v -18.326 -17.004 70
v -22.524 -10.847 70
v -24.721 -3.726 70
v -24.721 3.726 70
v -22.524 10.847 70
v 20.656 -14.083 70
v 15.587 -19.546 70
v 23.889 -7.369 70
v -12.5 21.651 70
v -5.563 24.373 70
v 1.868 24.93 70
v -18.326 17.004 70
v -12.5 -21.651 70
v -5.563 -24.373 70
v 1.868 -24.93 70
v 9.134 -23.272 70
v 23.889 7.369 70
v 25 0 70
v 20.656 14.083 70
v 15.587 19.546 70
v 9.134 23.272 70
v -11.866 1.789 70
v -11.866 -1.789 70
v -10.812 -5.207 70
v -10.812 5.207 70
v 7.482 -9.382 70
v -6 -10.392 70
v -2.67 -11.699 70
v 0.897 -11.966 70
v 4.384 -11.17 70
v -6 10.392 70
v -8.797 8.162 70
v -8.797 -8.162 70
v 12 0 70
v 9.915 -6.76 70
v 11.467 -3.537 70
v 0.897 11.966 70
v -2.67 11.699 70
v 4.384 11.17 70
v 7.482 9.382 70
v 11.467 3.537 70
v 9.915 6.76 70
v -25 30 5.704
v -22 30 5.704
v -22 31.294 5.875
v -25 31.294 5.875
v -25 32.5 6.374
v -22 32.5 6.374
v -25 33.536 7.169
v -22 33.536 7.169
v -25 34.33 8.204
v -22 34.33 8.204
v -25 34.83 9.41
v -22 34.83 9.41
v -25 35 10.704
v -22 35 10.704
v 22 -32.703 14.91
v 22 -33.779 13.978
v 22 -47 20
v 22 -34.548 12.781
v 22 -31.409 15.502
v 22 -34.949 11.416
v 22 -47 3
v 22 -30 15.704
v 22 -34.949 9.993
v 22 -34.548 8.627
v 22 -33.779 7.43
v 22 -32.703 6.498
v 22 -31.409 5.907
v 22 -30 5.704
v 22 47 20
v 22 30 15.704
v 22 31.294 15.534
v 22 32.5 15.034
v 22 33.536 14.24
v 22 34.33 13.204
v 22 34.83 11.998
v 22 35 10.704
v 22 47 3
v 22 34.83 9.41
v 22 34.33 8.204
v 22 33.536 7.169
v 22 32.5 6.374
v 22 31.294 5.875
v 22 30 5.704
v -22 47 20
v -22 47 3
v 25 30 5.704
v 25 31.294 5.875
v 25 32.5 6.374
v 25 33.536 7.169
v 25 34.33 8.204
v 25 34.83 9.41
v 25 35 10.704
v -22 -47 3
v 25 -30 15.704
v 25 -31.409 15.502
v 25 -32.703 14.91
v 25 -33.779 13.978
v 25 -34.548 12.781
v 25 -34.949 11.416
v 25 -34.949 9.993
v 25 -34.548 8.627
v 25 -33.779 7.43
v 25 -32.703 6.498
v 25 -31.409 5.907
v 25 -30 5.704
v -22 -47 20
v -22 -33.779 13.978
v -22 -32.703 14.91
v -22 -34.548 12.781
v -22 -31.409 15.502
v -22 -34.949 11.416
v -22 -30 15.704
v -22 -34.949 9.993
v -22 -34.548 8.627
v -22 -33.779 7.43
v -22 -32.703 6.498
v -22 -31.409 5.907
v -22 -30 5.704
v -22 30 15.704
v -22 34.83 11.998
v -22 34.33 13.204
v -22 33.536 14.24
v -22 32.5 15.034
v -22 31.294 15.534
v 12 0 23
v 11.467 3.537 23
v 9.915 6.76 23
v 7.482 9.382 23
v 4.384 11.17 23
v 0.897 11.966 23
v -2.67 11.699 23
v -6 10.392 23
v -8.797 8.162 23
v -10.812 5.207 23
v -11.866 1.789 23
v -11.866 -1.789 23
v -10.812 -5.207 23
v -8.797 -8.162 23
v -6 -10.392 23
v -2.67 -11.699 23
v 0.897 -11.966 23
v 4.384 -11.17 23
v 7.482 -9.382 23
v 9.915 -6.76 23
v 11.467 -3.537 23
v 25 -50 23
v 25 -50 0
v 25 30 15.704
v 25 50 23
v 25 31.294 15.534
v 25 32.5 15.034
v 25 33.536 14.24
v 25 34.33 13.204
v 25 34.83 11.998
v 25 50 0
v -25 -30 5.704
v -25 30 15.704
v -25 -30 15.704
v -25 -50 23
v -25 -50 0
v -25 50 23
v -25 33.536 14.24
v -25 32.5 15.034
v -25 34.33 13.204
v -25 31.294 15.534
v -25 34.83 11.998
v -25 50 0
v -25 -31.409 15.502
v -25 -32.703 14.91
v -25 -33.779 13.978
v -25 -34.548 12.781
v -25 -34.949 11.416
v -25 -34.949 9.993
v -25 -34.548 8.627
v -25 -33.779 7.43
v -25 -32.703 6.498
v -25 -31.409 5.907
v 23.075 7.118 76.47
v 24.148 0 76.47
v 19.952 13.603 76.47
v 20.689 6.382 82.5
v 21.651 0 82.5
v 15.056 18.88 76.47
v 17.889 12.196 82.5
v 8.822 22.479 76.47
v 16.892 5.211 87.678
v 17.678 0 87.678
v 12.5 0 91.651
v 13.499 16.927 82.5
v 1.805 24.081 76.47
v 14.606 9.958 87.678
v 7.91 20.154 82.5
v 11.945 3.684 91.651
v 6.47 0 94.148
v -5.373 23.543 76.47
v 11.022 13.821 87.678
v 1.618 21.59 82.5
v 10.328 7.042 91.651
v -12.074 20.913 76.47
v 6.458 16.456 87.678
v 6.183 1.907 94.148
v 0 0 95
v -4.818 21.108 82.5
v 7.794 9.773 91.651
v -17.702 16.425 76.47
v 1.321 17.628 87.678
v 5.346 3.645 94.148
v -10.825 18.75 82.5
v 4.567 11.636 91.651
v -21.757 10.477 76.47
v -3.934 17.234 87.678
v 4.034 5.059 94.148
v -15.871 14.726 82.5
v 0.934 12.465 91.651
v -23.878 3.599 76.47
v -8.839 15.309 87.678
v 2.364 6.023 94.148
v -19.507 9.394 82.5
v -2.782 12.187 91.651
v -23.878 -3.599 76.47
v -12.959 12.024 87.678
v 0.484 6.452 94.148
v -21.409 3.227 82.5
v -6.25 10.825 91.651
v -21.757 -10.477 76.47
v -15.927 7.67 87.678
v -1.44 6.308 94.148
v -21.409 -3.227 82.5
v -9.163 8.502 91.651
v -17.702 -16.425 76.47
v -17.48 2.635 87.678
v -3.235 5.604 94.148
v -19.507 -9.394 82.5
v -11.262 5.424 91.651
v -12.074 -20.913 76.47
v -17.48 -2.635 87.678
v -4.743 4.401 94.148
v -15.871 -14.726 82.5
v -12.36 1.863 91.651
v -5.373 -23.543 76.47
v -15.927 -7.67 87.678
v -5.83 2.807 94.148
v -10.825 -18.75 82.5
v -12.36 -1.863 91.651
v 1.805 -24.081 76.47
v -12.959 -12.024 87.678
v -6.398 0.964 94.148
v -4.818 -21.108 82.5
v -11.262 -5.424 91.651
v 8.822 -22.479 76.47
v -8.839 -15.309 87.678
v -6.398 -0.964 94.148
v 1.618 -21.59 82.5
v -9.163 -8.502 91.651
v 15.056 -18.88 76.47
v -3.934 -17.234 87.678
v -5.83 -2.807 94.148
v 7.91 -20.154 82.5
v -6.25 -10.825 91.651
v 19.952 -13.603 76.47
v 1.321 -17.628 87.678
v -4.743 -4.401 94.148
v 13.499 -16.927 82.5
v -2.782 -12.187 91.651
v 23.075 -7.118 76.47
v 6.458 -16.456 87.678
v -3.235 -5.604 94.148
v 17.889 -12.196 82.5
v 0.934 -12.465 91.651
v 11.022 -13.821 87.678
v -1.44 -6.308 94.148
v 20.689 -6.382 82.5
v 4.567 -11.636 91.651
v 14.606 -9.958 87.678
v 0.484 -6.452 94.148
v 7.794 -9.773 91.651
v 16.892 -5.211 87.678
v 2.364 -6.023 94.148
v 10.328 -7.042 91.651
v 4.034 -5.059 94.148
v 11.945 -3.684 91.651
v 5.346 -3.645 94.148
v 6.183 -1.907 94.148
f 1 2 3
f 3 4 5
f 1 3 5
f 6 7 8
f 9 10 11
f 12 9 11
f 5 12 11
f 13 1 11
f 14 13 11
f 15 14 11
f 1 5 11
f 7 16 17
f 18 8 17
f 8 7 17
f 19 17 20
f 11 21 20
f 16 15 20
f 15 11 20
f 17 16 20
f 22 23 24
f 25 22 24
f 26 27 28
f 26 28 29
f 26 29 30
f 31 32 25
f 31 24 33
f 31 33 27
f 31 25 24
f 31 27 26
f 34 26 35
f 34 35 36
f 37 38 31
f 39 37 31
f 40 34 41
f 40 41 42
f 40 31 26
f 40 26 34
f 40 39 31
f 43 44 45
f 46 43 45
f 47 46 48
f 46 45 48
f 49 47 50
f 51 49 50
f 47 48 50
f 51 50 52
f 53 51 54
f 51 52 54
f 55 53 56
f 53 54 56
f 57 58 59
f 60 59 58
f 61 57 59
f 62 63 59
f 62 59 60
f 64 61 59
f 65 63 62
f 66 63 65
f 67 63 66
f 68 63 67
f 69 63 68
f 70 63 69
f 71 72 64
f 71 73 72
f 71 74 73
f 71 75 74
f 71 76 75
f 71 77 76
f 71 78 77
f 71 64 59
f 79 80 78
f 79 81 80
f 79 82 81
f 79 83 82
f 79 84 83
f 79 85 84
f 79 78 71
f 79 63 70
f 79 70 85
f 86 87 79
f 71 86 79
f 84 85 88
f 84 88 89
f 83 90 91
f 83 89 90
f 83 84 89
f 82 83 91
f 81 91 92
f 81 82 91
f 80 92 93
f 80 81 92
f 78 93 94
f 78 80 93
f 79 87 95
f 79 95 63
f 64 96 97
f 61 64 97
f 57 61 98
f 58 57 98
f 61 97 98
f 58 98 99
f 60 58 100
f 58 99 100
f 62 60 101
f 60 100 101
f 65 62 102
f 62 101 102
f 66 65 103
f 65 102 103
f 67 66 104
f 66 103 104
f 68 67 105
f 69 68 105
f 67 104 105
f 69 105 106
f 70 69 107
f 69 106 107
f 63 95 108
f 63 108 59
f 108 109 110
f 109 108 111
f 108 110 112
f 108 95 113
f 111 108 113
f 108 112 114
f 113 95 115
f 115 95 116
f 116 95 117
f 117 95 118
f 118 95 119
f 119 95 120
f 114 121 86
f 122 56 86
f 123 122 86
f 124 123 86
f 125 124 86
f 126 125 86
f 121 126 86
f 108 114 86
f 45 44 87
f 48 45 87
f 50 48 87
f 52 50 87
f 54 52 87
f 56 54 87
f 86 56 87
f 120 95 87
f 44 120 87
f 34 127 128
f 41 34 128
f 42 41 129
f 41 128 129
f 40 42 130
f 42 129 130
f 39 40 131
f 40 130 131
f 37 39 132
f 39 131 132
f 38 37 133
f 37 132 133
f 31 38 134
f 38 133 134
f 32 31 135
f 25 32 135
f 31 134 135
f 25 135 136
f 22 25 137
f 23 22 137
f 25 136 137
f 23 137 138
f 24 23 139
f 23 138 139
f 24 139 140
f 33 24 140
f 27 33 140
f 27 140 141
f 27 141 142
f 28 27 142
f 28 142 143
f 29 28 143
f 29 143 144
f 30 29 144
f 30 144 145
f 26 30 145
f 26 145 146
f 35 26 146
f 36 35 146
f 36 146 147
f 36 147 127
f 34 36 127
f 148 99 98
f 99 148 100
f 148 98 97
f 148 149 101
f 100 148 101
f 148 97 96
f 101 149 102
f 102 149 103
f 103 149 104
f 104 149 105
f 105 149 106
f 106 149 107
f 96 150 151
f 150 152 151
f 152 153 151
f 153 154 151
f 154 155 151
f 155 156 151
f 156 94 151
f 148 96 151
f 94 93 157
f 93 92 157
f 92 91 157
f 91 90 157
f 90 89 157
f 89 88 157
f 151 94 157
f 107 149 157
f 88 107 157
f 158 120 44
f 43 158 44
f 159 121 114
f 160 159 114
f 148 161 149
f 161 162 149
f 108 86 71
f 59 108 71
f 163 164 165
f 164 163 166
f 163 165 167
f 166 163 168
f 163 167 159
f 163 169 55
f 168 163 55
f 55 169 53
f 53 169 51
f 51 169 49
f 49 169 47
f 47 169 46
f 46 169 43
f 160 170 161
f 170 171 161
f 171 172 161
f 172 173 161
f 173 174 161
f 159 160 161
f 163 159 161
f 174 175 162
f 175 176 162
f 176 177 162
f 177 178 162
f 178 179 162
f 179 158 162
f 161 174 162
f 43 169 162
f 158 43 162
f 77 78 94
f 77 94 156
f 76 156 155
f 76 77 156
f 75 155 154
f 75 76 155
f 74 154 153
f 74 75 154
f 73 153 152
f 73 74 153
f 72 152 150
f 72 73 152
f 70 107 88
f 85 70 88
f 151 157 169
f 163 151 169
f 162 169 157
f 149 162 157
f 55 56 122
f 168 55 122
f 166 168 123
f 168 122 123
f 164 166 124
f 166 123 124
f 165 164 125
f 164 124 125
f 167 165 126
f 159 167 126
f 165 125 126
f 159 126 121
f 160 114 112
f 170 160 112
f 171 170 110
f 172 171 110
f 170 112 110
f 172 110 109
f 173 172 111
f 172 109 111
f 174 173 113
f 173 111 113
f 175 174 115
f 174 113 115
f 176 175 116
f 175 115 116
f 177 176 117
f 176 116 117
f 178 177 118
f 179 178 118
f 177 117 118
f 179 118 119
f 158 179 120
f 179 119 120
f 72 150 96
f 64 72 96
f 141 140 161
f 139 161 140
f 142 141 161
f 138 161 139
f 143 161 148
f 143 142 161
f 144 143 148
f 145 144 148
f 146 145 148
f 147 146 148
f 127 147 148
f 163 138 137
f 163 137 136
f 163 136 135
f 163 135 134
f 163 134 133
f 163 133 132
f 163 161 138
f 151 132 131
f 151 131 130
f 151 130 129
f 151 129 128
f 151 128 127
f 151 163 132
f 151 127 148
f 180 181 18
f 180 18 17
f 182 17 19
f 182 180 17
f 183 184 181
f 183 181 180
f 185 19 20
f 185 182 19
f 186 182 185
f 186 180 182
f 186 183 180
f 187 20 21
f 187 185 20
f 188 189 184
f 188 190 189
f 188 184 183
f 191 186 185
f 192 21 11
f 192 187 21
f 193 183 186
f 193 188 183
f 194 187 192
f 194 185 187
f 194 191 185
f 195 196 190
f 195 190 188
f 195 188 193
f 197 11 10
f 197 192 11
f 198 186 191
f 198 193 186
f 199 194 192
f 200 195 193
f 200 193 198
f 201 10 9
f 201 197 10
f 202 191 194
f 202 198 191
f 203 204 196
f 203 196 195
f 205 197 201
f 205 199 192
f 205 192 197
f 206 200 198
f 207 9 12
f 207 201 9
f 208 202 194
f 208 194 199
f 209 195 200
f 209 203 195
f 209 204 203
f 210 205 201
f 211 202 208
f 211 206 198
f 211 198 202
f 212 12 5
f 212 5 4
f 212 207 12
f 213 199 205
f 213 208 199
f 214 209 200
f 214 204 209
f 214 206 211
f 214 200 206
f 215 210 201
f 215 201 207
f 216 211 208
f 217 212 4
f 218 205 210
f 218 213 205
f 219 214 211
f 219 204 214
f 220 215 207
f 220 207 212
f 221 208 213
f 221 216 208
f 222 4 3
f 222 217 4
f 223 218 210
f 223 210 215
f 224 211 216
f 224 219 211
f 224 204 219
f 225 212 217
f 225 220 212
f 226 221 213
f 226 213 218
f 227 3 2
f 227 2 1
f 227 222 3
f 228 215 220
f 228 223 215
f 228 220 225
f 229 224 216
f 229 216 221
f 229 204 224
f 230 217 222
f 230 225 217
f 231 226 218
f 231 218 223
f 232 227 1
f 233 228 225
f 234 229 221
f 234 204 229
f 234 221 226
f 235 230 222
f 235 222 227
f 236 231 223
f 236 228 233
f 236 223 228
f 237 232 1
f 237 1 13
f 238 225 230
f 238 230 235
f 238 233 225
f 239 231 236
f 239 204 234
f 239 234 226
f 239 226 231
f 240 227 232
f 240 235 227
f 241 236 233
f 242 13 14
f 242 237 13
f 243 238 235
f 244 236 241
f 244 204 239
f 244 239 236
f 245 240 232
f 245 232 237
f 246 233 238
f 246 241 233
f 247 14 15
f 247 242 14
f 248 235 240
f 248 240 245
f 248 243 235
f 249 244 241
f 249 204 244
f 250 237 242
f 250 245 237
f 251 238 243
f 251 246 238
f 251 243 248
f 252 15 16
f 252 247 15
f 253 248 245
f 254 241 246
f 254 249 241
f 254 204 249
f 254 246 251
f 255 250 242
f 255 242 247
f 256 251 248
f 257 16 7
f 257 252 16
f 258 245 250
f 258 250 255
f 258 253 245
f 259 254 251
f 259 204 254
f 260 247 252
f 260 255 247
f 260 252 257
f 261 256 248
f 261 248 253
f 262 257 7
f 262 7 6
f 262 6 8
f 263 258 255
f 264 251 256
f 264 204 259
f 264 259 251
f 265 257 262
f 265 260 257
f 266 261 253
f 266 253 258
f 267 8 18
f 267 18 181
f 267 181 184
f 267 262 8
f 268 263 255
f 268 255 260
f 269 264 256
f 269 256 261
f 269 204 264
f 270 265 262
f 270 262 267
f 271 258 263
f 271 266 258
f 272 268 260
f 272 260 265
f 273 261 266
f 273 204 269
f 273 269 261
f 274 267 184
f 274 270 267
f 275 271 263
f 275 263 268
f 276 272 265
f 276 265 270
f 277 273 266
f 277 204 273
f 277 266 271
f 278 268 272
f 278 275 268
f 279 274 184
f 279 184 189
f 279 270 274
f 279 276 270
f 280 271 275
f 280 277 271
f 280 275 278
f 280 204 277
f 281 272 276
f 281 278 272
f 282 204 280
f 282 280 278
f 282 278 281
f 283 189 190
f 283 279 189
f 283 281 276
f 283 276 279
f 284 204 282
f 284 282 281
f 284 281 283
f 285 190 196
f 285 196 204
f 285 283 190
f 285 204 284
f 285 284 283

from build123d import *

# Parameters (mm, degrees)
F0_W      = 50
F0_H      = 100
F0_W_2    = 44
F0_H_2    = 94
F1_DEPTH  = 20
F2_DEPTH  = 3
F3_R      = 12
F4_DEPTH  = 3
F5_DEPTH  = 50
F6_R      = 25
F6_R_2    = 12
F7_DEPTH  = 25
F8_R      = 24.99999
F10_DEPTH = 30


# Not quite as in the source:
# - a fillet or chamfer is up to 0.001 mm smaller than in the source, because OpenCascade refuses the exact size
# - a feature names something its author has since deleted; it is built from what else it names


with BuildPart() as f1:
    # F0 (on Top) → F1 (new body)
    with BuildSketch(Plane.XY):
        Rectangle(F0_W, F0_H)
        Rectangle(F0_W_2, F0_H_2, mode=Mode.SUBTRACT)
    extrude(amount=F1_DEPTH)

    # F0 (on Top) → F2 (join)
    with BuildSketch(Plane.XY):
        Rectangle(F0_W, F0_H)
        Rectangle(F0_W_2, F0_H_2, mode=Mode.SUBTRACT)
        Rectangle(F0_W_2, F0_H_2)
    extrude(amount=F2_DEPTH)

    # F3 (on face) → F4 (join)
    with BuildSketch(Plane.XY.offset(20)):
        with BuildLine():
            ThreePointArc((22, 11.874342087), (0, 25), (-22, 11.874342087))
            Line((-22, 11.874342087), (-22, -11.874342087))
            ThreePointArc((-22, -11.874342087), (0, -25), (22, -11.874342087))
            Line((22, -11.874342087), (22, 11.874342087))
        make_face()
        Circle(F3_R, mode=Mode.SUBTRACT)
        with BuildLine():
            ThreePointArc((22, -11.874342087), (0, -25), (-22, -11.874342087))
            Line((-22, -11.874342087), (-22, -47))
            Line((-22, -47), (22, -47))
            Line((22, -47), (22, -11.874342087))
        make_face()
        with BuildLine():
            Line((-22, 47), (-22, 11.874342087))
            ThreePointArc((-22, 11.874342087), (0, 25), (22, 11.874342087))
            Line((22, 11.874342087), (22, 47))
            Line((22, 47), (-22, 47))
        make_face()
        Circle(F3_R)
        with BuildLine():
            Line((25, 50), (-25, 50))
            Line((-25, 50), (-25, -5.13e-08))
            ThreePointArc((-25, -5.13e-08), (-24.2383992934, 6.1237243321), (-22, 11.874342087))
            Line((-22, 11.874342087), (-22, 47))
            Line((-22, 47), (22, 47))
            Line((22, 47), (22, 11.874342087))
            ThreePointArc((22, 11.874342087), (24.2383992871, 6.123724357), (25, 0))
            Line((25, 0), (25, 50))
        make_face()
        with BuildLine():
            ThreePointArc((-22, -11.874342087), (-24.2383992808, -6.1237243818), (-25, -5.13e-08))
            Line((-25, -5.13e-08), (-25, -50))
            Line((-25, -50), (25, -50))
            Line((25, -50), (25, 0))
            ThreePointArc((25, 0), (24.2383992871, -6.123724357), (22, -11.874342087))
            Line((22, -11.874342087), (22, -47))
            Line((22, -47), (-22, -47))
            Line((-22, -47), (-22, -11.874342087))
        make_face()
        with BuildLine():
            ThreePointArc((22, -11.874342087), (24.2383992871, -6.123724357), (25, 0))
            ThreePointArc((25, 0), (24.2383992871, 6.123724357), (22, 11.874342087))
            Line((22, 11.874342087), (22, -11.874342087))
        make_face()
        with BuildLine():
            ThreePointArc((-22, 11.874342087), (-24.2383992934, 6.1237243321), (-25, -5.13e-08))
            ThreePointArc((-25, -5.13e-08), (-24.2383992808, -6.1237243818), (-22, -11.874342087))
            Line((-22, -11.874342087), (-22, 11.874342087))
        make_face()
    extrude(amount=F4_DEPTH)

    # F3 (on face) → F5 (join)
    with BuildSketch(Plane.XY.offset(20)):
        Circle(F3_R)
    extrude(amount=F5_DEPTH)

    # F9 (on Right) → F10 (cut, symmetric)
    with BuildSketch(Plane.YZ):
        with BuildLine():
            ThreePointArc((-25, 10.7041401789), (-26.4644660941, 14.2396740848), (-30, 15.7041401789))
            ThreePointArc((-30, 15.7041401789), (-35, 10.7041401789), (-30, 5.7041401789))
            ThreePointArc((-30, 5.7041401789), (-26.4644660941, 7.1686062729), (-25, 10.7041401789))
        make_face()
        with BuildLine():
            ThreePointArc((30, 5.7041401789), (25, 10.7041401789), (30, 15.7041401789))
            Line((30, 15.7041401789), (-30, 15.7041401789))
            ThreePointArc((-30, 15.7041401789), (-26.4644660941, 14.2396740848), (-25, 10.7041401789))
            ThreePointArc((-25, 10.7041401789), (-26.4644660941, 7.1686062729), (-30, 5.7041401789))
            Line((-30, 5.7041401789), (30, 5.7041401789))
        make_face()
        with BuildLine():
            ThreePointArc((30, 5.7041401789), (33.5355339059, 7.1686062729), (35, 10.7041401789))
            ThreePointArc((35, 10.7041401789), (33.5355339059, 14.2396740848), (30, 15.7041401789))
            ThreePointArc((30, 15.7041401789), (25, 10.7041401789), (30, 5.7041401789))
        make_face()
    extrude(amount=F10_DEPTH, both=True, mode=Mode.SUBTRACT)


with BuildPart() as f7:
    # F6 (on face) → F7 (new body)
    with BuildSketch(Plane.XY.offset(70)):
        Circle(F6_R)
        Circle(F6_R_2, mode=Mode.SUBTRACT)
        Circle(F6_R_2)
    extrude(amount=F7_DEPTH)

    # F8 (radius 25 in the source; OpenCascade refuses exactly that, so slightly less here)
    f8_edges = [f7.edges().sort_by_distance(p)[0] for p in [
        (-25, 0, 95),
    ]]
    fillet(f8_edges, radius=F8_R)


solid = Compound([f1.part, f7.part])
